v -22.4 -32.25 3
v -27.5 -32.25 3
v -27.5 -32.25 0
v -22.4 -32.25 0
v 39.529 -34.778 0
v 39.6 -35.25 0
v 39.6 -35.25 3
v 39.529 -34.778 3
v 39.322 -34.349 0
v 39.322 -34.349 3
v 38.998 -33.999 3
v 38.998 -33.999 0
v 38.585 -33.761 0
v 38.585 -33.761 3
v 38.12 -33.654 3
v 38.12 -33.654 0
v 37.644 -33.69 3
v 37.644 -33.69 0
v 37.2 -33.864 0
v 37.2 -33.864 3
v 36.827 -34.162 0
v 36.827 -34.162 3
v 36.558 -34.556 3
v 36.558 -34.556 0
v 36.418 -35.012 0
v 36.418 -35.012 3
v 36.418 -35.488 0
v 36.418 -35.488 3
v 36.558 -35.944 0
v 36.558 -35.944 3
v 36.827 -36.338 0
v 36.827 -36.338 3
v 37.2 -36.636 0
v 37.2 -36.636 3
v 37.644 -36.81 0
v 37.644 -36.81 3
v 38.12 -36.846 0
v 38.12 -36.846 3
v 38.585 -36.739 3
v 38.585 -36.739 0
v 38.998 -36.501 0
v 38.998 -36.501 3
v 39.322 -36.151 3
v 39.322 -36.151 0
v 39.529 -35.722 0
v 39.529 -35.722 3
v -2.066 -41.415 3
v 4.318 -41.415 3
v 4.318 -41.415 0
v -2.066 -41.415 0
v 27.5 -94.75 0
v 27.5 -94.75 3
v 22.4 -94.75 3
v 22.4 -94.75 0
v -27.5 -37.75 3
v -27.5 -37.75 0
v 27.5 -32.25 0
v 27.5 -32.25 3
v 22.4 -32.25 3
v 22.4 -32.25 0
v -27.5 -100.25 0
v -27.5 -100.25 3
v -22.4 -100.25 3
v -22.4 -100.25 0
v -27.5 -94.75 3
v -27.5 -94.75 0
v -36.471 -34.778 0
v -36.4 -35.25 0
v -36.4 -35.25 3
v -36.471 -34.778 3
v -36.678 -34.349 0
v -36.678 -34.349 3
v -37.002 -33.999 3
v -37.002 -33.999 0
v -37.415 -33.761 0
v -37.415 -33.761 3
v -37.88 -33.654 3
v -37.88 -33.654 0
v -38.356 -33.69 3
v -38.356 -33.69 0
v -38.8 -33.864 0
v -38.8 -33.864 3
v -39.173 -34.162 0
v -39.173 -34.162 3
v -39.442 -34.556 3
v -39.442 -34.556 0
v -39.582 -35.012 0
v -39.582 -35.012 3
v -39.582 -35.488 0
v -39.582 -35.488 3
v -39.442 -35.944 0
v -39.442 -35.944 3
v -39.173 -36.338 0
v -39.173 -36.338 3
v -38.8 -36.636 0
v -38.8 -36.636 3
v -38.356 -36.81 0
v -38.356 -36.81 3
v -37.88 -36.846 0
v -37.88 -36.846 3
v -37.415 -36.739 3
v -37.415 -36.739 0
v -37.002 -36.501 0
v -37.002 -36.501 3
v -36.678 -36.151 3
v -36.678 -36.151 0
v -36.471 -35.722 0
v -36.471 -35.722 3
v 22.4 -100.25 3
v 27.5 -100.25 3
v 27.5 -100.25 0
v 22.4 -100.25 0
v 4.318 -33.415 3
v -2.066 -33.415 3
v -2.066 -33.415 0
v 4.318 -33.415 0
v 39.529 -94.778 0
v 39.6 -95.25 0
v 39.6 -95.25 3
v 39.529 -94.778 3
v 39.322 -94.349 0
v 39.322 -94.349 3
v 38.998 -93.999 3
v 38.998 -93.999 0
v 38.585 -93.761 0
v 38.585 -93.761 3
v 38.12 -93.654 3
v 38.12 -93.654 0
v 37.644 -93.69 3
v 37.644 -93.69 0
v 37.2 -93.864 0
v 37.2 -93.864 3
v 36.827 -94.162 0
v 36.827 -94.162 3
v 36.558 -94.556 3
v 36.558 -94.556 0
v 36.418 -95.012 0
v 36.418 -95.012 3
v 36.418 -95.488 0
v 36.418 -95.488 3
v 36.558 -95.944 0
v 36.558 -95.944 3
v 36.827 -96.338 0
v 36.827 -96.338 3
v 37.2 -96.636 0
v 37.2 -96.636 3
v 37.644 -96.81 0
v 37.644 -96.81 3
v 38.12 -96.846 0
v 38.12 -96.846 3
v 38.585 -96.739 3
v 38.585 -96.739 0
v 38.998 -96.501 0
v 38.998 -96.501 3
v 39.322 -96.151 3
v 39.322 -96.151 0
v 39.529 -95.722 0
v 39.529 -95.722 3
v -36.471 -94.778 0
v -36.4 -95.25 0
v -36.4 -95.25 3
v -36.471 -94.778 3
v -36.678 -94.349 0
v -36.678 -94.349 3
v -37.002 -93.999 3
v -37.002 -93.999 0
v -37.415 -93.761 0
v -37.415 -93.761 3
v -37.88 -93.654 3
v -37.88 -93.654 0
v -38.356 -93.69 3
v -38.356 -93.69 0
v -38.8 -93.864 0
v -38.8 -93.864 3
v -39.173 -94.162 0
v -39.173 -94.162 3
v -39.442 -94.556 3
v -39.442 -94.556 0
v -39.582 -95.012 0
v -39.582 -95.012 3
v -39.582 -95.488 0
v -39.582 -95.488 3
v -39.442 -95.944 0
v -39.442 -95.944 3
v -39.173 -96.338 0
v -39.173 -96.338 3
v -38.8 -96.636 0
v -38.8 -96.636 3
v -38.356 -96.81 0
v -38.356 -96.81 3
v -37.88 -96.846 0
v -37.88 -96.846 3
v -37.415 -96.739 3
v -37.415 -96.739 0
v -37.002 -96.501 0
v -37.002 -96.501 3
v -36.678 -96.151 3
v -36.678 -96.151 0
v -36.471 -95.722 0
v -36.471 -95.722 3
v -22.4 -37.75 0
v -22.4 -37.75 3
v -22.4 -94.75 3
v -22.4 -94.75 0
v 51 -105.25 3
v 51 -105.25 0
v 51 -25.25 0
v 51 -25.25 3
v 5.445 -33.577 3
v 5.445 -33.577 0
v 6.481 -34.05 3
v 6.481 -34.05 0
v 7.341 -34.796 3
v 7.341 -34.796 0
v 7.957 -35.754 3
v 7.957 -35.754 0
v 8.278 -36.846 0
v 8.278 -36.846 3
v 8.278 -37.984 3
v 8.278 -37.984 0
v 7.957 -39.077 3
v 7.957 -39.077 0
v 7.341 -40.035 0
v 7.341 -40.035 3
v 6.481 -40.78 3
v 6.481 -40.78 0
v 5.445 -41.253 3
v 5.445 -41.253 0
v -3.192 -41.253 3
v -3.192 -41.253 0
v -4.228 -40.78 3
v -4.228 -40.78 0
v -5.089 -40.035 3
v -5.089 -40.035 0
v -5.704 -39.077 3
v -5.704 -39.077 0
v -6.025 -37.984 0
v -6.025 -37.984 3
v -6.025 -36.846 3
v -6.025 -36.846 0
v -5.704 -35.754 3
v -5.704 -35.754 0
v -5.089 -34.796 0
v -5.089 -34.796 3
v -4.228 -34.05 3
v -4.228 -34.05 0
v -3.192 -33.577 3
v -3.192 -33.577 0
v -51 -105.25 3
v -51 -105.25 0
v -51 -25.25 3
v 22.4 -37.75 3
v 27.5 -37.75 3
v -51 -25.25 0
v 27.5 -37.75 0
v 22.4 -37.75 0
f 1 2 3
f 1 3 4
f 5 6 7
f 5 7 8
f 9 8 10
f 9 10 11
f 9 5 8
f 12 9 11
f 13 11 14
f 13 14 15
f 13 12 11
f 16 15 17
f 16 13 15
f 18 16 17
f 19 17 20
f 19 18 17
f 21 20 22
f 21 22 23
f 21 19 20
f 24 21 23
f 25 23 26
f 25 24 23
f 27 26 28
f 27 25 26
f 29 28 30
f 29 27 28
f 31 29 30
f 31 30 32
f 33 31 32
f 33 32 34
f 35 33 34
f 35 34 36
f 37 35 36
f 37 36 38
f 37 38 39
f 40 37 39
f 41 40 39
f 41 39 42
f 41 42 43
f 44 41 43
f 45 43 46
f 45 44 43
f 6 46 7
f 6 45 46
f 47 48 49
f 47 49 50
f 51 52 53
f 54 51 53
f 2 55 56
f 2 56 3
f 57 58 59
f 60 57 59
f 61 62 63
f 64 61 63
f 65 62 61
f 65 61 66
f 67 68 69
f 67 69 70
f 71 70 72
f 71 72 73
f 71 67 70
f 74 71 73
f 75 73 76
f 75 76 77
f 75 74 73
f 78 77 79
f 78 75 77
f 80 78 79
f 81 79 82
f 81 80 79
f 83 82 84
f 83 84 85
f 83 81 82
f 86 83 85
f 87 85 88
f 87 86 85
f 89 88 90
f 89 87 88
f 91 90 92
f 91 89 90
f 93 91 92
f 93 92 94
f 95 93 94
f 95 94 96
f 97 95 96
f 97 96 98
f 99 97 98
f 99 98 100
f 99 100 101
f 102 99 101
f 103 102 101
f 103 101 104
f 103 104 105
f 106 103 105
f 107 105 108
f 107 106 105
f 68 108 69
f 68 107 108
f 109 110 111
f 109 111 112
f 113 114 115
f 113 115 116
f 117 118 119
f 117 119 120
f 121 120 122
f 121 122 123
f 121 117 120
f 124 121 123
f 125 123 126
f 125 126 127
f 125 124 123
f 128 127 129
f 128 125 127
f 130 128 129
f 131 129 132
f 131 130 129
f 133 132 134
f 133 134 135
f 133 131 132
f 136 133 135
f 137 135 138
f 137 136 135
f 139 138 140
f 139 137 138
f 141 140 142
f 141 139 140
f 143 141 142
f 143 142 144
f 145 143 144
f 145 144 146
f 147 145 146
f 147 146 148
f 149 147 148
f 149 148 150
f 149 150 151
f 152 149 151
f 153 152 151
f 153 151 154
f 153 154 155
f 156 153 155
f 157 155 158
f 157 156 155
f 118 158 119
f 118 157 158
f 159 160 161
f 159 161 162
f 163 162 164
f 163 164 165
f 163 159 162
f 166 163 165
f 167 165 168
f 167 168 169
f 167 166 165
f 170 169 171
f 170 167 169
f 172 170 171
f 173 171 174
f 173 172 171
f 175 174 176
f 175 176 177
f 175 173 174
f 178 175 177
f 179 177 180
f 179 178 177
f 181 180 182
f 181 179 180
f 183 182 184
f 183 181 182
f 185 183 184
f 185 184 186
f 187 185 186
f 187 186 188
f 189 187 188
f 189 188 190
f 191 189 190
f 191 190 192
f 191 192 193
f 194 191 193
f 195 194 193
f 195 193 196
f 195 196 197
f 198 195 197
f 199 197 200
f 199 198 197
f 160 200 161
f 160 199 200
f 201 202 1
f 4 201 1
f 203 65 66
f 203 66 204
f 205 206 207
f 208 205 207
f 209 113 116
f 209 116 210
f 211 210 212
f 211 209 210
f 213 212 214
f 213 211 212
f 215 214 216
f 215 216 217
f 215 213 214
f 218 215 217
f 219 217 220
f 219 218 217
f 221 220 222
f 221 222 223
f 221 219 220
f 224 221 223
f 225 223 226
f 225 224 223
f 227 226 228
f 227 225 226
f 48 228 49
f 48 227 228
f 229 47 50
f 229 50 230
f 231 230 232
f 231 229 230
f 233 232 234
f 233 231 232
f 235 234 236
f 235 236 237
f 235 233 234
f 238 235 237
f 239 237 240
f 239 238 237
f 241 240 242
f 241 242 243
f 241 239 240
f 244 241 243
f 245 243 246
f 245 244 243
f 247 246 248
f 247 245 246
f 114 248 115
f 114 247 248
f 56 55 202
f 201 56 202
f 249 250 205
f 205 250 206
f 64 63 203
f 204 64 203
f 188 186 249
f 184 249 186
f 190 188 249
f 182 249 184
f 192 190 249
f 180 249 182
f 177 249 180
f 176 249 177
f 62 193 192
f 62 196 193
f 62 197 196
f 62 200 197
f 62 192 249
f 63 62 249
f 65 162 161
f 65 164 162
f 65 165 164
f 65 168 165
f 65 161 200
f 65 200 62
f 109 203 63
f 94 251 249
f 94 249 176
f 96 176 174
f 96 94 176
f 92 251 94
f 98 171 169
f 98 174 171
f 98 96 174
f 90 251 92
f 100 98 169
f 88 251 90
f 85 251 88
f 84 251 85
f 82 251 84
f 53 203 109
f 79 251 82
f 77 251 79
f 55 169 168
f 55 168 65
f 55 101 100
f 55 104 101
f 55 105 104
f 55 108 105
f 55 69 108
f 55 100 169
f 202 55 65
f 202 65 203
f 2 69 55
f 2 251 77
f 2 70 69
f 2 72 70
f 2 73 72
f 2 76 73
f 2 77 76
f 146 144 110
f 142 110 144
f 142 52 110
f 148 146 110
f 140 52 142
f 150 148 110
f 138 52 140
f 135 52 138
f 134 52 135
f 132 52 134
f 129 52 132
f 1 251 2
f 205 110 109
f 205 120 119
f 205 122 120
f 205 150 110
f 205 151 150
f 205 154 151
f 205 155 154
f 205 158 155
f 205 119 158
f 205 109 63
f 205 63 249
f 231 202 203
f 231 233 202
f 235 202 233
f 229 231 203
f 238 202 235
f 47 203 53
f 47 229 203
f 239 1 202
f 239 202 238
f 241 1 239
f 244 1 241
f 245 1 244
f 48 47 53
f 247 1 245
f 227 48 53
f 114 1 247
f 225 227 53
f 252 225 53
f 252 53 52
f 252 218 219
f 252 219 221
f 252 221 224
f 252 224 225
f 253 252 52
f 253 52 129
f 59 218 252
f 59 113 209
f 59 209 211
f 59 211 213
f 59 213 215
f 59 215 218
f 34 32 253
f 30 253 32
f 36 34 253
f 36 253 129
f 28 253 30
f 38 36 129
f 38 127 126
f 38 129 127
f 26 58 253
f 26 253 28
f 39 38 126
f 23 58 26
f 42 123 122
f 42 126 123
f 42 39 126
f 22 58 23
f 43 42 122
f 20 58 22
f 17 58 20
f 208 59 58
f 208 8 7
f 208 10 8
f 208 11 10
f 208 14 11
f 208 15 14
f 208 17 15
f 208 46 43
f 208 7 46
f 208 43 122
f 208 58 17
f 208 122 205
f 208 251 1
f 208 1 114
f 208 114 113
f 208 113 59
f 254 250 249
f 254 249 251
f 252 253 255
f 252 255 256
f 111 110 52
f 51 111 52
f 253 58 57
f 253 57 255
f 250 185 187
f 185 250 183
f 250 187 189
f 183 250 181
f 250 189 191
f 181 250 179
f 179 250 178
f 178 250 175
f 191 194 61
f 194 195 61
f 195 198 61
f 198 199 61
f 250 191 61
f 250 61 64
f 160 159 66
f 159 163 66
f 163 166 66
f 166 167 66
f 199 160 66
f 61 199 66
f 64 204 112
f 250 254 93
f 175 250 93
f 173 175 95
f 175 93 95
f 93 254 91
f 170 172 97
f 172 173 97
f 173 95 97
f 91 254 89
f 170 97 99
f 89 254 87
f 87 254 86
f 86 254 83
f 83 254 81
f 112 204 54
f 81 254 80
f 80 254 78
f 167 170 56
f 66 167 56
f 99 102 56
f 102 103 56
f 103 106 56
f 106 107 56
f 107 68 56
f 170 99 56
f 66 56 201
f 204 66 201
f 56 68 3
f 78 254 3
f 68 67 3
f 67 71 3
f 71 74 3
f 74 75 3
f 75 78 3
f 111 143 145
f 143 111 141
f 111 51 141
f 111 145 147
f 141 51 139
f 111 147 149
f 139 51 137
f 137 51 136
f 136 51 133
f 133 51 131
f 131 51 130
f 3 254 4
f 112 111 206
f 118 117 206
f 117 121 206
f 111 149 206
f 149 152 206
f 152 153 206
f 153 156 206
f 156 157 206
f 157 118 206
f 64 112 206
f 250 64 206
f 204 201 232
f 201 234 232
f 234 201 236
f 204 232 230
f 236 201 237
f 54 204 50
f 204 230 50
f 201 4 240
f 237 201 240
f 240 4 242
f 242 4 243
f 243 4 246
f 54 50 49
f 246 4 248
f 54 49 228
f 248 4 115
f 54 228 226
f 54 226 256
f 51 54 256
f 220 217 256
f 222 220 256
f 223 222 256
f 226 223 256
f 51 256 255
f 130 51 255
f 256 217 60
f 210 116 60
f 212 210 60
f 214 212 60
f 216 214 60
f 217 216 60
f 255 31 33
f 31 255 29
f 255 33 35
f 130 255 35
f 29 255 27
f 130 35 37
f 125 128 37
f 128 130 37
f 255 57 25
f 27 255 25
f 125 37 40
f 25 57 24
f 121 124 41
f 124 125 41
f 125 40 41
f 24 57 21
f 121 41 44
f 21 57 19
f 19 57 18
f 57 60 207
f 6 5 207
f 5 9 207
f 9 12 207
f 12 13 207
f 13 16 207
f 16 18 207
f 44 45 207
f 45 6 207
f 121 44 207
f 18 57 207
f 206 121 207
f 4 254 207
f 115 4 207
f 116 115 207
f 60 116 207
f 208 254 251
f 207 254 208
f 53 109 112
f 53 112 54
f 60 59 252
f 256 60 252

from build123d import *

# Parameters (mm, degrees)
SKETCH_1_W                       = 102
SKETCH_1_H                       = 80
SKETCH_1_R                       = 1.6
EXTRUDE_1_DEPTH                  = 3
CUT_EXTRUDE_1_DEPTH              = 3
SKETCH_4_W                       = 5.1
SKETCH_4_H                       = 5.5
CUT_EXTRUDE_2_DEPTH              = 5
PATTERN_LINEAR_1_COUNT           = 2
PATTERN_LINEAR_1_PITCH           = 62.5
PATTERN_LINEAR_1_COPY_1_SKETCH_W = 5.1
PATTERN_LINEAR_1_COPY_1_SKETCH_H = 5.5
PATTERN_LINEAR_1_COPY_1_DEPTH    = 5


with BuildPart() as part:
    # 草图1 → 凸台-拉伸1 (new body)
    with BuildSketch(Plane.XY):
        with Locations((0, -65.25)):
            Rectangle(SKETCH_1_W, SKETCH_1_H)
        with Locations((-38, -35.25)):
            Circle(SKETCH_1_R, mode=Mode.SUBTRACT)
        with Locations((-38, -95.25)):
            Circle(SKETCH_1_R, mode=Mode.SUBTRACT)
        with Locations((38, -95.25)):
            Circle(SKETCH_1_R, mode=Mode.SUBTRACT)
        with Locations((38, -35.25)):
            Circle(SKETCH_1_R, mode=Mode.SUBTRACT)
    extrude(amount=EXTRUDE_1_DEPTH)

    # 草图3 → 切除-拉伸1 (cut)
    with BuildSketch(Plane.XY.offset(3)):
        with BuildLine():
            Line((-2.065542075, -33.415194888), (4.318378476, -33.415194888))
            ThreePointArc((4.318378476, -33.415194888), (8.318378476, -37.415194888), (4.318378476, -41.415194888))
            Line((4.318378476, -41.415194888), (-2.065542075, -41.415194888))
            ThreePointArc((-2.065542075, -41.415194888), (-6.065542075, -37.415194888), (-2.065542075, -33.415194888))
        make_face()
    extrude(amount=-CUT_EXTRUDE_1_DEPTH, mode=Mode.SUBTRACT)

    # 草图4 → 切除-拉伸2 (cut)
    with BuildSketch(Plane.XY.offset(3)):
        with Locations((-24.95, -97.5)):
            Rectangle(SKETCH_4_W, SKETCH_4_H)
    cut_extrude_2 = extrude(amount=-CUT_EXTRUDE_2_DEPTH, mode=Mode.SUBTRACT)

    # 镜向1: 切除-拉伸2 across plane
    add(cut_extrude_2.mirror(Plane.ZY), mode=Mode.SUBTRACT)

    # 阵列(线性)1: 切除-拉伸2 ×2
    with Locations(*[(0, i * PATTERN_LINEAR_1_PITCH, 0) for i in range(1, PATTERN_LINEAR_1_COUNT)]):
        add(cut_extrude_2, mode=Mode.SUBTRACT)

    # 阵列(线性)1 copy 1 sketch → 阵列(线性)1 copy 1 (cut)
    with BuildSketch(Plane(origin=(0, 62.5, 3), x_dir=(-1, 0, 0), z_dir=(0, 0, 1))):
        with Locations((-24.95, 97.5)):
            Rectangle(PATTERN_LINEAR_1_COPY_1_SKETCH_W, PATTERN_LINEAR_1_COPY_1_SKETCH_H)
    extrude(amount=-PATTERN_LINEAR_1_COPY_1_DEPTH, mode=Mode.SUBTRACT)


solid = part.part
